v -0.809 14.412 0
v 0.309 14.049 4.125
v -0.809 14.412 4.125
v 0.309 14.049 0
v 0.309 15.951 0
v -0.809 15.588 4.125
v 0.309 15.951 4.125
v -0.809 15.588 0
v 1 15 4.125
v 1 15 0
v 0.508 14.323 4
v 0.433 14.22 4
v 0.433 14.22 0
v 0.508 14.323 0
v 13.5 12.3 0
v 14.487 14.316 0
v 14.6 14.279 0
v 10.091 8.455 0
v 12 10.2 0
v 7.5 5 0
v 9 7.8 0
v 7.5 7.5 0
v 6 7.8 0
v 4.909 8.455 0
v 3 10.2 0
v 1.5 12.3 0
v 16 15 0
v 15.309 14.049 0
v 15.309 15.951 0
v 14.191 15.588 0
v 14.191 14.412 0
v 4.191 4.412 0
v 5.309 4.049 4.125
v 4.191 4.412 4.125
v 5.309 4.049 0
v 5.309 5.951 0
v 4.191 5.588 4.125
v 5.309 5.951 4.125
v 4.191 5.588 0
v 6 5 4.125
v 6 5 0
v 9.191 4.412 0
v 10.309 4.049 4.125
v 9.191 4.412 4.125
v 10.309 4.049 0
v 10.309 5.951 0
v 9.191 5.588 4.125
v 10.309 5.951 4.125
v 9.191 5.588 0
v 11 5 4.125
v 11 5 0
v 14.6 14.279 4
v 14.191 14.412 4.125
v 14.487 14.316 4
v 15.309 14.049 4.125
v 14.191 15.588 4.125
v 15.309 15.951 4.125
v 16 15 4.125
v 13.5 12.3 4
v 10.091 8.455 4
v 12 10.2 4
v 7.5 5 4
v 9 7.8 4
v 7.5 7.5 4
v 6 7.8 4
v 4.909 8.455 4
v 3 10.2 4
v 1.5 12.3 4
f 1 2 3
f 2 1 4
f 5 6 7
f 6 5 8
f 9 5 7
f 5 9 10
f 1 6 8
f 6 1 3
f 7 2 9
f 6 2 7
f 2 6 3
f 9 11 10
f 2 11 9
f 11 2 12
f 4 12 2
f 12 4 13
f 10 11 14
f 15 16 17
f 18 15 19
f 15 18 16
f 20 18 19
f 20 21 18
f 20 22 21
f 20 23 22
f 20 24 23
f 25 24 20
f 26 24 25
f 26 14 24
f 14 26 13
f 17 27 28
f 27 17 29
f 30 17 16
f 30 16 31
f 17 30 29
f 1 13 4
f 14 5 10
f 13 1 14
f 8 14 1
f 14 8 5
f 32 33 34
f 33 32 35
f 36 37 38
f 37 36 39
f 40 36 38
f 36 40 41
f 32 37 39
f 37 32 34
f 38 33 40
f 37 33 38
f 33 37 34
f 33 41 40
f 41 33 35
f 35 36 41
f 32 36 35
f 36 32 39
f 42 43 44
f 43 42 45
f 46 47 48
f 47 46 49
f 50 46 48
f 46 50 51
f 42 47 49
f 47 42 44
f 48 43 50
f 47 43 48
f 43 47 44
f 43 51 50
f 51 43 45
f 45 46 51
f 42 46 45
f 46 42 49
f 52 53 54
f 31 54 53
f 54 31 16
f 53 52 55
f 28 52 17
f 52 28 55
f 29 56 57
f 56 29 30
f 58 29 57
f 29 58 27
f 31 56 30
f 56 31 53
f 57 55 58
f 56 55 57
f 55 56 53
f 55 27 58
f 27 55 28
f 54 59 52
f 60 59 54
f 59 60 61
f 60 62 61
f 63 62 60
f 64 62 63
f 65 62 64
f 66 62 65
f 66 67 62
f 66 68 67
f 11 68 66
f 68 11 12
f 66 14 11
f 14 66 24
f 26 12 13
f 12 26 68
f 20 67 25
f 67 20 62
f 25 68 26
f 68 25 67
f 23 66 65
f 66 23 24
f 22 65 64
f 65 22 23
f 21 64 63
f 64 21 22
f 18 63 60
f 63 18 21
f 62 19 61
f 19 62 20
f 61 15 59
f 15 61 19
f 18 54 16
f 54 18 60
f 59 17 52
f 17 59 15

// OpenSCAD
joinfactor = 0.125;

gFocalPoint = [0,0];
gSteps = 10;
gHeight = 4;

BezQuadCurve( [[0, 15],[5,5],[10,5],[15,15]], [7.5,5], gSteps, gHeight);

//=======================================
// Functions
//=======================================
function BEZ03(u) = pow((1-u), 3);
function BEZ13(u) = 3*u*(pow((1-u),2));
function BEZ23(u) = 3*(pow(u,2))*(1-u);
function BEZ33(u) = pow(u,3);

function PointAlongBez4(p0, p1, p2, p3, u) = [
	BEZ03(u)*p0[0]+BEZ13(u)*p1[0]+BEZ23(u)*p2[0]+BEZ33(u)*p3[0],
	BEZ03(u)*p0[1]+BEZ13(u)*p1[1]+BEZ23(u)*p2[1]+BEZ33(u)*p3[1]];

//=======================================
// Modules
//=======================================
// c - ControlPoints
module BezQuadCurve(c, focalPoint, steps=gSteps, height=gHeight)
{
	// Draw control points
	// Just comment this out when you're doing the real thing
	for(point=[0:3])
	{
		translate(c[point])
		color([1,0,0])
		cylinder(r=1, h=height+joinfactor);
	}

	for(step = [steps:1])
	{
		linear_extrude(height = height, convexity = 10) 
		polygon(
			points=[
				focalPoint,
				PointAlongBez4(c[0], c[1], c[2],c[3], step/steps),
				PointAlongBez4(c[0], c[1], c[2],c[3], (step-1)/steps)],
			paths=[[0,1,2,0]]
		);
	}
}

//==============================================
// Test functions
//==============================================
//PlotBEZ0(100);
//PlotBEZ1(100);
//PlotBEZ2(100);
//PlotBEZ3(100);
//PlotBez4Blending();


module PlotBEZ0(steps)
{
	cubeSize = 1;
	cubeHeight = steps;

	for (step=[0:steps])
	{
		translate([cubeSize*step, 0, 0])
		cube(size=[cubeSize, cubeSize, BEZ03(step/steps)*cubeHeight]);
	}	
}

module PlotBEZ1(steps)
{
	cubeSize = 1;
	cubeHeight = steps;

	for (step=[0:steps])
	{
		translate([cubeSize*step, 0, 0])
		cube(size=[cubeSize, cubeSize, BEZ13(step/steps)*cubeHeight]);
	}	
}

module PlotBEZ2(steps)
{
	cubeSize = 1;
	cubeHeight = steps;

	for (step=[0:steps])
	{
		translate([cubeSize*step, 0, 0])
		cube(size=[cubeSize, cubeSize, BEZ23(step/steps)*cubeHeight]);
	}	
}

module PlotBEZ3(steps)
{
	cubeSize = 1;
	cubeHeight = steps;

	for (step=[0:steps])
	{
		translate([cubeSize*step, 0, 0])
		cube(size=[cubeSize, cubeSize, BEZ33(step/steps)*cubeHeight]);
	}	
}

module PlotBez4Blending()
{
	sizing = 100;

	translate([0, 0, sizing + 10])
	PlotBEZ0(100);

	translate([sizing+10, 0, sizing + 10])
	PlotBEZ1(100);

	translate([0, 0, 0])
	PlotBEZ2(100);

	translate([sizing+10, 0, 0])
	PlotBEZ3(100);
}
